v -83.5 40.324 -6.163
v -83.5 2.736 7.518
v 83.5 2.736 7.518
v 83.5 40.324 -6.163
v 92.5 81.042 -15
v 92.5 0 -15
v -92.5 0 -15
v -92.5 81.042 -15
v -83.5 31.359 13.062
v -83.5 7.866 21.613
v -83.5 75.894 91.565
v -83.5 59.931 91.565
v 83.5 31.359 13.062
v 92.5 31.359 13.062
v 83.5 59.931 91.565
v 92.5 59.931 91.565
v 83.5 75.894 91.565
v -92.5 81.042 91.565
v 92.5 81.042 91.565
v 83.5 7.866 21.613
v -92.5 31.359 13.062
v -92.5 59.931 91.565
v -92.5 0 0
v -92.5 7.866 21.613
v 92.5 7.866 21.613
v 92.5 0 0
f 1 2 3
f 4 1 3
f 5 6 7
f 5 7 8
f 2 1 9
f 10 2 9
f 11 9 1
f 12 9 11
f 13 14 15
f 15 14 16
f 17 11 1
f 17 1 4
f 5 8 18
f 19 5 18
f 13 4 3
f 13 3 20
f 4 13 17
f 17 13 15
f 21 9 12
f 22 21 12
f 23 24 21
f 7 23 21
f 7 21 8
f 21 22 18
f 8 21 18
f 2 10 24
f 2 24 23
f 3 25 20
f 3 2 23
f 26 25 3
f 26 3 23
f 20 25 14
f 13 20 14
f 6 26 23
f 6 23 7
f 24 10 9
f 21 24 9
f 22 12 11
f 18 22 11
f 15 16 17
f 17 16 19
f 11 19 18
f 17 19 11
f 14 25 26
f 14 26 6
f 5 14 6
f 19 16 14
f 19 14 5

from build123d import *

# Parameters (mm, degrees)
F0_W     = 40
F0_H     = 112.7631144943
F1_DEPTH = 92.5
F2_W     = 167
F2_H     = 104
F3_DEPTH = 40
F4_W     = 19.1075097164
F4_H     = 21.1983466993
F5_DEPTH = 200
F7_DEPTH = 200


with BuildPart() as f1:
    # F0 (on Right) → F1 (new body, symmetric)
    with BuildSketch(Plane.YZ):
        Polygon((41.0424171991, 112.7631144943), (0, 0), (41.0424171991, 0), align=None)
        Polygon((41.0424171991, 0), (0, 0), (0, -15), (81.0424171991, -15), (81.0424171991, 0), align=None)
        with Locations((61.0424171991, 56.3815572472)):
            Rectangle(F0_W, F0_H)
    extrude(amount=F1_DEPTH, both=True)

    # F2 (on face) → F3 (cut)
    with BuildSketch(Plane(origin=(0, 0, 0), x_dir=(1, 0, 0), z_dir=(0, -0.9396926208, 0.3420201433))):
        with Locations((0, 60)):
            Rectangle(F2_W, F2_H)
    extrude(amount=-F3_DEPTH, mode=Mode.SUBTRACT)

    # F4 (on face) → F5 (cut)
    with BuildSketch(Plane.YZ.offset(92.5)):
        with Locations((90.5961720573, 102.1639411447)):
            Rectangle(F4_W, F4_H)
        Polygon((81.0424171991, 91.564767795), (81.0424171991, 112.7631144943), (41.0424171991, 112.7631144943), (33.3268499849, 91.564767795), align=None)
        Polygon((33.3268499849, 91.564767795), (41.0424171991, 112.7631144943), (33.0099269154, 112.7631144943), (33.0099269154, 91.564767795), align=None)
    extrude(amount=-F5_DEPTH, mode=Mode.SUBTRACT)

    # F6 (on face) → F7 (cut)
    with BuildSketch(Plane.YZ.offset(92.5)):
        Polygon((33.3268499849, 91.564767795), (7.8664632965, 21.6129302781), (31.3587788161, 13.0624266949), (59.9312942968, 91.564767795), align=None)
    extrude(amount=-F7_DEPTH, mode=Mode.SUBTRACT)


solid = f1.part
